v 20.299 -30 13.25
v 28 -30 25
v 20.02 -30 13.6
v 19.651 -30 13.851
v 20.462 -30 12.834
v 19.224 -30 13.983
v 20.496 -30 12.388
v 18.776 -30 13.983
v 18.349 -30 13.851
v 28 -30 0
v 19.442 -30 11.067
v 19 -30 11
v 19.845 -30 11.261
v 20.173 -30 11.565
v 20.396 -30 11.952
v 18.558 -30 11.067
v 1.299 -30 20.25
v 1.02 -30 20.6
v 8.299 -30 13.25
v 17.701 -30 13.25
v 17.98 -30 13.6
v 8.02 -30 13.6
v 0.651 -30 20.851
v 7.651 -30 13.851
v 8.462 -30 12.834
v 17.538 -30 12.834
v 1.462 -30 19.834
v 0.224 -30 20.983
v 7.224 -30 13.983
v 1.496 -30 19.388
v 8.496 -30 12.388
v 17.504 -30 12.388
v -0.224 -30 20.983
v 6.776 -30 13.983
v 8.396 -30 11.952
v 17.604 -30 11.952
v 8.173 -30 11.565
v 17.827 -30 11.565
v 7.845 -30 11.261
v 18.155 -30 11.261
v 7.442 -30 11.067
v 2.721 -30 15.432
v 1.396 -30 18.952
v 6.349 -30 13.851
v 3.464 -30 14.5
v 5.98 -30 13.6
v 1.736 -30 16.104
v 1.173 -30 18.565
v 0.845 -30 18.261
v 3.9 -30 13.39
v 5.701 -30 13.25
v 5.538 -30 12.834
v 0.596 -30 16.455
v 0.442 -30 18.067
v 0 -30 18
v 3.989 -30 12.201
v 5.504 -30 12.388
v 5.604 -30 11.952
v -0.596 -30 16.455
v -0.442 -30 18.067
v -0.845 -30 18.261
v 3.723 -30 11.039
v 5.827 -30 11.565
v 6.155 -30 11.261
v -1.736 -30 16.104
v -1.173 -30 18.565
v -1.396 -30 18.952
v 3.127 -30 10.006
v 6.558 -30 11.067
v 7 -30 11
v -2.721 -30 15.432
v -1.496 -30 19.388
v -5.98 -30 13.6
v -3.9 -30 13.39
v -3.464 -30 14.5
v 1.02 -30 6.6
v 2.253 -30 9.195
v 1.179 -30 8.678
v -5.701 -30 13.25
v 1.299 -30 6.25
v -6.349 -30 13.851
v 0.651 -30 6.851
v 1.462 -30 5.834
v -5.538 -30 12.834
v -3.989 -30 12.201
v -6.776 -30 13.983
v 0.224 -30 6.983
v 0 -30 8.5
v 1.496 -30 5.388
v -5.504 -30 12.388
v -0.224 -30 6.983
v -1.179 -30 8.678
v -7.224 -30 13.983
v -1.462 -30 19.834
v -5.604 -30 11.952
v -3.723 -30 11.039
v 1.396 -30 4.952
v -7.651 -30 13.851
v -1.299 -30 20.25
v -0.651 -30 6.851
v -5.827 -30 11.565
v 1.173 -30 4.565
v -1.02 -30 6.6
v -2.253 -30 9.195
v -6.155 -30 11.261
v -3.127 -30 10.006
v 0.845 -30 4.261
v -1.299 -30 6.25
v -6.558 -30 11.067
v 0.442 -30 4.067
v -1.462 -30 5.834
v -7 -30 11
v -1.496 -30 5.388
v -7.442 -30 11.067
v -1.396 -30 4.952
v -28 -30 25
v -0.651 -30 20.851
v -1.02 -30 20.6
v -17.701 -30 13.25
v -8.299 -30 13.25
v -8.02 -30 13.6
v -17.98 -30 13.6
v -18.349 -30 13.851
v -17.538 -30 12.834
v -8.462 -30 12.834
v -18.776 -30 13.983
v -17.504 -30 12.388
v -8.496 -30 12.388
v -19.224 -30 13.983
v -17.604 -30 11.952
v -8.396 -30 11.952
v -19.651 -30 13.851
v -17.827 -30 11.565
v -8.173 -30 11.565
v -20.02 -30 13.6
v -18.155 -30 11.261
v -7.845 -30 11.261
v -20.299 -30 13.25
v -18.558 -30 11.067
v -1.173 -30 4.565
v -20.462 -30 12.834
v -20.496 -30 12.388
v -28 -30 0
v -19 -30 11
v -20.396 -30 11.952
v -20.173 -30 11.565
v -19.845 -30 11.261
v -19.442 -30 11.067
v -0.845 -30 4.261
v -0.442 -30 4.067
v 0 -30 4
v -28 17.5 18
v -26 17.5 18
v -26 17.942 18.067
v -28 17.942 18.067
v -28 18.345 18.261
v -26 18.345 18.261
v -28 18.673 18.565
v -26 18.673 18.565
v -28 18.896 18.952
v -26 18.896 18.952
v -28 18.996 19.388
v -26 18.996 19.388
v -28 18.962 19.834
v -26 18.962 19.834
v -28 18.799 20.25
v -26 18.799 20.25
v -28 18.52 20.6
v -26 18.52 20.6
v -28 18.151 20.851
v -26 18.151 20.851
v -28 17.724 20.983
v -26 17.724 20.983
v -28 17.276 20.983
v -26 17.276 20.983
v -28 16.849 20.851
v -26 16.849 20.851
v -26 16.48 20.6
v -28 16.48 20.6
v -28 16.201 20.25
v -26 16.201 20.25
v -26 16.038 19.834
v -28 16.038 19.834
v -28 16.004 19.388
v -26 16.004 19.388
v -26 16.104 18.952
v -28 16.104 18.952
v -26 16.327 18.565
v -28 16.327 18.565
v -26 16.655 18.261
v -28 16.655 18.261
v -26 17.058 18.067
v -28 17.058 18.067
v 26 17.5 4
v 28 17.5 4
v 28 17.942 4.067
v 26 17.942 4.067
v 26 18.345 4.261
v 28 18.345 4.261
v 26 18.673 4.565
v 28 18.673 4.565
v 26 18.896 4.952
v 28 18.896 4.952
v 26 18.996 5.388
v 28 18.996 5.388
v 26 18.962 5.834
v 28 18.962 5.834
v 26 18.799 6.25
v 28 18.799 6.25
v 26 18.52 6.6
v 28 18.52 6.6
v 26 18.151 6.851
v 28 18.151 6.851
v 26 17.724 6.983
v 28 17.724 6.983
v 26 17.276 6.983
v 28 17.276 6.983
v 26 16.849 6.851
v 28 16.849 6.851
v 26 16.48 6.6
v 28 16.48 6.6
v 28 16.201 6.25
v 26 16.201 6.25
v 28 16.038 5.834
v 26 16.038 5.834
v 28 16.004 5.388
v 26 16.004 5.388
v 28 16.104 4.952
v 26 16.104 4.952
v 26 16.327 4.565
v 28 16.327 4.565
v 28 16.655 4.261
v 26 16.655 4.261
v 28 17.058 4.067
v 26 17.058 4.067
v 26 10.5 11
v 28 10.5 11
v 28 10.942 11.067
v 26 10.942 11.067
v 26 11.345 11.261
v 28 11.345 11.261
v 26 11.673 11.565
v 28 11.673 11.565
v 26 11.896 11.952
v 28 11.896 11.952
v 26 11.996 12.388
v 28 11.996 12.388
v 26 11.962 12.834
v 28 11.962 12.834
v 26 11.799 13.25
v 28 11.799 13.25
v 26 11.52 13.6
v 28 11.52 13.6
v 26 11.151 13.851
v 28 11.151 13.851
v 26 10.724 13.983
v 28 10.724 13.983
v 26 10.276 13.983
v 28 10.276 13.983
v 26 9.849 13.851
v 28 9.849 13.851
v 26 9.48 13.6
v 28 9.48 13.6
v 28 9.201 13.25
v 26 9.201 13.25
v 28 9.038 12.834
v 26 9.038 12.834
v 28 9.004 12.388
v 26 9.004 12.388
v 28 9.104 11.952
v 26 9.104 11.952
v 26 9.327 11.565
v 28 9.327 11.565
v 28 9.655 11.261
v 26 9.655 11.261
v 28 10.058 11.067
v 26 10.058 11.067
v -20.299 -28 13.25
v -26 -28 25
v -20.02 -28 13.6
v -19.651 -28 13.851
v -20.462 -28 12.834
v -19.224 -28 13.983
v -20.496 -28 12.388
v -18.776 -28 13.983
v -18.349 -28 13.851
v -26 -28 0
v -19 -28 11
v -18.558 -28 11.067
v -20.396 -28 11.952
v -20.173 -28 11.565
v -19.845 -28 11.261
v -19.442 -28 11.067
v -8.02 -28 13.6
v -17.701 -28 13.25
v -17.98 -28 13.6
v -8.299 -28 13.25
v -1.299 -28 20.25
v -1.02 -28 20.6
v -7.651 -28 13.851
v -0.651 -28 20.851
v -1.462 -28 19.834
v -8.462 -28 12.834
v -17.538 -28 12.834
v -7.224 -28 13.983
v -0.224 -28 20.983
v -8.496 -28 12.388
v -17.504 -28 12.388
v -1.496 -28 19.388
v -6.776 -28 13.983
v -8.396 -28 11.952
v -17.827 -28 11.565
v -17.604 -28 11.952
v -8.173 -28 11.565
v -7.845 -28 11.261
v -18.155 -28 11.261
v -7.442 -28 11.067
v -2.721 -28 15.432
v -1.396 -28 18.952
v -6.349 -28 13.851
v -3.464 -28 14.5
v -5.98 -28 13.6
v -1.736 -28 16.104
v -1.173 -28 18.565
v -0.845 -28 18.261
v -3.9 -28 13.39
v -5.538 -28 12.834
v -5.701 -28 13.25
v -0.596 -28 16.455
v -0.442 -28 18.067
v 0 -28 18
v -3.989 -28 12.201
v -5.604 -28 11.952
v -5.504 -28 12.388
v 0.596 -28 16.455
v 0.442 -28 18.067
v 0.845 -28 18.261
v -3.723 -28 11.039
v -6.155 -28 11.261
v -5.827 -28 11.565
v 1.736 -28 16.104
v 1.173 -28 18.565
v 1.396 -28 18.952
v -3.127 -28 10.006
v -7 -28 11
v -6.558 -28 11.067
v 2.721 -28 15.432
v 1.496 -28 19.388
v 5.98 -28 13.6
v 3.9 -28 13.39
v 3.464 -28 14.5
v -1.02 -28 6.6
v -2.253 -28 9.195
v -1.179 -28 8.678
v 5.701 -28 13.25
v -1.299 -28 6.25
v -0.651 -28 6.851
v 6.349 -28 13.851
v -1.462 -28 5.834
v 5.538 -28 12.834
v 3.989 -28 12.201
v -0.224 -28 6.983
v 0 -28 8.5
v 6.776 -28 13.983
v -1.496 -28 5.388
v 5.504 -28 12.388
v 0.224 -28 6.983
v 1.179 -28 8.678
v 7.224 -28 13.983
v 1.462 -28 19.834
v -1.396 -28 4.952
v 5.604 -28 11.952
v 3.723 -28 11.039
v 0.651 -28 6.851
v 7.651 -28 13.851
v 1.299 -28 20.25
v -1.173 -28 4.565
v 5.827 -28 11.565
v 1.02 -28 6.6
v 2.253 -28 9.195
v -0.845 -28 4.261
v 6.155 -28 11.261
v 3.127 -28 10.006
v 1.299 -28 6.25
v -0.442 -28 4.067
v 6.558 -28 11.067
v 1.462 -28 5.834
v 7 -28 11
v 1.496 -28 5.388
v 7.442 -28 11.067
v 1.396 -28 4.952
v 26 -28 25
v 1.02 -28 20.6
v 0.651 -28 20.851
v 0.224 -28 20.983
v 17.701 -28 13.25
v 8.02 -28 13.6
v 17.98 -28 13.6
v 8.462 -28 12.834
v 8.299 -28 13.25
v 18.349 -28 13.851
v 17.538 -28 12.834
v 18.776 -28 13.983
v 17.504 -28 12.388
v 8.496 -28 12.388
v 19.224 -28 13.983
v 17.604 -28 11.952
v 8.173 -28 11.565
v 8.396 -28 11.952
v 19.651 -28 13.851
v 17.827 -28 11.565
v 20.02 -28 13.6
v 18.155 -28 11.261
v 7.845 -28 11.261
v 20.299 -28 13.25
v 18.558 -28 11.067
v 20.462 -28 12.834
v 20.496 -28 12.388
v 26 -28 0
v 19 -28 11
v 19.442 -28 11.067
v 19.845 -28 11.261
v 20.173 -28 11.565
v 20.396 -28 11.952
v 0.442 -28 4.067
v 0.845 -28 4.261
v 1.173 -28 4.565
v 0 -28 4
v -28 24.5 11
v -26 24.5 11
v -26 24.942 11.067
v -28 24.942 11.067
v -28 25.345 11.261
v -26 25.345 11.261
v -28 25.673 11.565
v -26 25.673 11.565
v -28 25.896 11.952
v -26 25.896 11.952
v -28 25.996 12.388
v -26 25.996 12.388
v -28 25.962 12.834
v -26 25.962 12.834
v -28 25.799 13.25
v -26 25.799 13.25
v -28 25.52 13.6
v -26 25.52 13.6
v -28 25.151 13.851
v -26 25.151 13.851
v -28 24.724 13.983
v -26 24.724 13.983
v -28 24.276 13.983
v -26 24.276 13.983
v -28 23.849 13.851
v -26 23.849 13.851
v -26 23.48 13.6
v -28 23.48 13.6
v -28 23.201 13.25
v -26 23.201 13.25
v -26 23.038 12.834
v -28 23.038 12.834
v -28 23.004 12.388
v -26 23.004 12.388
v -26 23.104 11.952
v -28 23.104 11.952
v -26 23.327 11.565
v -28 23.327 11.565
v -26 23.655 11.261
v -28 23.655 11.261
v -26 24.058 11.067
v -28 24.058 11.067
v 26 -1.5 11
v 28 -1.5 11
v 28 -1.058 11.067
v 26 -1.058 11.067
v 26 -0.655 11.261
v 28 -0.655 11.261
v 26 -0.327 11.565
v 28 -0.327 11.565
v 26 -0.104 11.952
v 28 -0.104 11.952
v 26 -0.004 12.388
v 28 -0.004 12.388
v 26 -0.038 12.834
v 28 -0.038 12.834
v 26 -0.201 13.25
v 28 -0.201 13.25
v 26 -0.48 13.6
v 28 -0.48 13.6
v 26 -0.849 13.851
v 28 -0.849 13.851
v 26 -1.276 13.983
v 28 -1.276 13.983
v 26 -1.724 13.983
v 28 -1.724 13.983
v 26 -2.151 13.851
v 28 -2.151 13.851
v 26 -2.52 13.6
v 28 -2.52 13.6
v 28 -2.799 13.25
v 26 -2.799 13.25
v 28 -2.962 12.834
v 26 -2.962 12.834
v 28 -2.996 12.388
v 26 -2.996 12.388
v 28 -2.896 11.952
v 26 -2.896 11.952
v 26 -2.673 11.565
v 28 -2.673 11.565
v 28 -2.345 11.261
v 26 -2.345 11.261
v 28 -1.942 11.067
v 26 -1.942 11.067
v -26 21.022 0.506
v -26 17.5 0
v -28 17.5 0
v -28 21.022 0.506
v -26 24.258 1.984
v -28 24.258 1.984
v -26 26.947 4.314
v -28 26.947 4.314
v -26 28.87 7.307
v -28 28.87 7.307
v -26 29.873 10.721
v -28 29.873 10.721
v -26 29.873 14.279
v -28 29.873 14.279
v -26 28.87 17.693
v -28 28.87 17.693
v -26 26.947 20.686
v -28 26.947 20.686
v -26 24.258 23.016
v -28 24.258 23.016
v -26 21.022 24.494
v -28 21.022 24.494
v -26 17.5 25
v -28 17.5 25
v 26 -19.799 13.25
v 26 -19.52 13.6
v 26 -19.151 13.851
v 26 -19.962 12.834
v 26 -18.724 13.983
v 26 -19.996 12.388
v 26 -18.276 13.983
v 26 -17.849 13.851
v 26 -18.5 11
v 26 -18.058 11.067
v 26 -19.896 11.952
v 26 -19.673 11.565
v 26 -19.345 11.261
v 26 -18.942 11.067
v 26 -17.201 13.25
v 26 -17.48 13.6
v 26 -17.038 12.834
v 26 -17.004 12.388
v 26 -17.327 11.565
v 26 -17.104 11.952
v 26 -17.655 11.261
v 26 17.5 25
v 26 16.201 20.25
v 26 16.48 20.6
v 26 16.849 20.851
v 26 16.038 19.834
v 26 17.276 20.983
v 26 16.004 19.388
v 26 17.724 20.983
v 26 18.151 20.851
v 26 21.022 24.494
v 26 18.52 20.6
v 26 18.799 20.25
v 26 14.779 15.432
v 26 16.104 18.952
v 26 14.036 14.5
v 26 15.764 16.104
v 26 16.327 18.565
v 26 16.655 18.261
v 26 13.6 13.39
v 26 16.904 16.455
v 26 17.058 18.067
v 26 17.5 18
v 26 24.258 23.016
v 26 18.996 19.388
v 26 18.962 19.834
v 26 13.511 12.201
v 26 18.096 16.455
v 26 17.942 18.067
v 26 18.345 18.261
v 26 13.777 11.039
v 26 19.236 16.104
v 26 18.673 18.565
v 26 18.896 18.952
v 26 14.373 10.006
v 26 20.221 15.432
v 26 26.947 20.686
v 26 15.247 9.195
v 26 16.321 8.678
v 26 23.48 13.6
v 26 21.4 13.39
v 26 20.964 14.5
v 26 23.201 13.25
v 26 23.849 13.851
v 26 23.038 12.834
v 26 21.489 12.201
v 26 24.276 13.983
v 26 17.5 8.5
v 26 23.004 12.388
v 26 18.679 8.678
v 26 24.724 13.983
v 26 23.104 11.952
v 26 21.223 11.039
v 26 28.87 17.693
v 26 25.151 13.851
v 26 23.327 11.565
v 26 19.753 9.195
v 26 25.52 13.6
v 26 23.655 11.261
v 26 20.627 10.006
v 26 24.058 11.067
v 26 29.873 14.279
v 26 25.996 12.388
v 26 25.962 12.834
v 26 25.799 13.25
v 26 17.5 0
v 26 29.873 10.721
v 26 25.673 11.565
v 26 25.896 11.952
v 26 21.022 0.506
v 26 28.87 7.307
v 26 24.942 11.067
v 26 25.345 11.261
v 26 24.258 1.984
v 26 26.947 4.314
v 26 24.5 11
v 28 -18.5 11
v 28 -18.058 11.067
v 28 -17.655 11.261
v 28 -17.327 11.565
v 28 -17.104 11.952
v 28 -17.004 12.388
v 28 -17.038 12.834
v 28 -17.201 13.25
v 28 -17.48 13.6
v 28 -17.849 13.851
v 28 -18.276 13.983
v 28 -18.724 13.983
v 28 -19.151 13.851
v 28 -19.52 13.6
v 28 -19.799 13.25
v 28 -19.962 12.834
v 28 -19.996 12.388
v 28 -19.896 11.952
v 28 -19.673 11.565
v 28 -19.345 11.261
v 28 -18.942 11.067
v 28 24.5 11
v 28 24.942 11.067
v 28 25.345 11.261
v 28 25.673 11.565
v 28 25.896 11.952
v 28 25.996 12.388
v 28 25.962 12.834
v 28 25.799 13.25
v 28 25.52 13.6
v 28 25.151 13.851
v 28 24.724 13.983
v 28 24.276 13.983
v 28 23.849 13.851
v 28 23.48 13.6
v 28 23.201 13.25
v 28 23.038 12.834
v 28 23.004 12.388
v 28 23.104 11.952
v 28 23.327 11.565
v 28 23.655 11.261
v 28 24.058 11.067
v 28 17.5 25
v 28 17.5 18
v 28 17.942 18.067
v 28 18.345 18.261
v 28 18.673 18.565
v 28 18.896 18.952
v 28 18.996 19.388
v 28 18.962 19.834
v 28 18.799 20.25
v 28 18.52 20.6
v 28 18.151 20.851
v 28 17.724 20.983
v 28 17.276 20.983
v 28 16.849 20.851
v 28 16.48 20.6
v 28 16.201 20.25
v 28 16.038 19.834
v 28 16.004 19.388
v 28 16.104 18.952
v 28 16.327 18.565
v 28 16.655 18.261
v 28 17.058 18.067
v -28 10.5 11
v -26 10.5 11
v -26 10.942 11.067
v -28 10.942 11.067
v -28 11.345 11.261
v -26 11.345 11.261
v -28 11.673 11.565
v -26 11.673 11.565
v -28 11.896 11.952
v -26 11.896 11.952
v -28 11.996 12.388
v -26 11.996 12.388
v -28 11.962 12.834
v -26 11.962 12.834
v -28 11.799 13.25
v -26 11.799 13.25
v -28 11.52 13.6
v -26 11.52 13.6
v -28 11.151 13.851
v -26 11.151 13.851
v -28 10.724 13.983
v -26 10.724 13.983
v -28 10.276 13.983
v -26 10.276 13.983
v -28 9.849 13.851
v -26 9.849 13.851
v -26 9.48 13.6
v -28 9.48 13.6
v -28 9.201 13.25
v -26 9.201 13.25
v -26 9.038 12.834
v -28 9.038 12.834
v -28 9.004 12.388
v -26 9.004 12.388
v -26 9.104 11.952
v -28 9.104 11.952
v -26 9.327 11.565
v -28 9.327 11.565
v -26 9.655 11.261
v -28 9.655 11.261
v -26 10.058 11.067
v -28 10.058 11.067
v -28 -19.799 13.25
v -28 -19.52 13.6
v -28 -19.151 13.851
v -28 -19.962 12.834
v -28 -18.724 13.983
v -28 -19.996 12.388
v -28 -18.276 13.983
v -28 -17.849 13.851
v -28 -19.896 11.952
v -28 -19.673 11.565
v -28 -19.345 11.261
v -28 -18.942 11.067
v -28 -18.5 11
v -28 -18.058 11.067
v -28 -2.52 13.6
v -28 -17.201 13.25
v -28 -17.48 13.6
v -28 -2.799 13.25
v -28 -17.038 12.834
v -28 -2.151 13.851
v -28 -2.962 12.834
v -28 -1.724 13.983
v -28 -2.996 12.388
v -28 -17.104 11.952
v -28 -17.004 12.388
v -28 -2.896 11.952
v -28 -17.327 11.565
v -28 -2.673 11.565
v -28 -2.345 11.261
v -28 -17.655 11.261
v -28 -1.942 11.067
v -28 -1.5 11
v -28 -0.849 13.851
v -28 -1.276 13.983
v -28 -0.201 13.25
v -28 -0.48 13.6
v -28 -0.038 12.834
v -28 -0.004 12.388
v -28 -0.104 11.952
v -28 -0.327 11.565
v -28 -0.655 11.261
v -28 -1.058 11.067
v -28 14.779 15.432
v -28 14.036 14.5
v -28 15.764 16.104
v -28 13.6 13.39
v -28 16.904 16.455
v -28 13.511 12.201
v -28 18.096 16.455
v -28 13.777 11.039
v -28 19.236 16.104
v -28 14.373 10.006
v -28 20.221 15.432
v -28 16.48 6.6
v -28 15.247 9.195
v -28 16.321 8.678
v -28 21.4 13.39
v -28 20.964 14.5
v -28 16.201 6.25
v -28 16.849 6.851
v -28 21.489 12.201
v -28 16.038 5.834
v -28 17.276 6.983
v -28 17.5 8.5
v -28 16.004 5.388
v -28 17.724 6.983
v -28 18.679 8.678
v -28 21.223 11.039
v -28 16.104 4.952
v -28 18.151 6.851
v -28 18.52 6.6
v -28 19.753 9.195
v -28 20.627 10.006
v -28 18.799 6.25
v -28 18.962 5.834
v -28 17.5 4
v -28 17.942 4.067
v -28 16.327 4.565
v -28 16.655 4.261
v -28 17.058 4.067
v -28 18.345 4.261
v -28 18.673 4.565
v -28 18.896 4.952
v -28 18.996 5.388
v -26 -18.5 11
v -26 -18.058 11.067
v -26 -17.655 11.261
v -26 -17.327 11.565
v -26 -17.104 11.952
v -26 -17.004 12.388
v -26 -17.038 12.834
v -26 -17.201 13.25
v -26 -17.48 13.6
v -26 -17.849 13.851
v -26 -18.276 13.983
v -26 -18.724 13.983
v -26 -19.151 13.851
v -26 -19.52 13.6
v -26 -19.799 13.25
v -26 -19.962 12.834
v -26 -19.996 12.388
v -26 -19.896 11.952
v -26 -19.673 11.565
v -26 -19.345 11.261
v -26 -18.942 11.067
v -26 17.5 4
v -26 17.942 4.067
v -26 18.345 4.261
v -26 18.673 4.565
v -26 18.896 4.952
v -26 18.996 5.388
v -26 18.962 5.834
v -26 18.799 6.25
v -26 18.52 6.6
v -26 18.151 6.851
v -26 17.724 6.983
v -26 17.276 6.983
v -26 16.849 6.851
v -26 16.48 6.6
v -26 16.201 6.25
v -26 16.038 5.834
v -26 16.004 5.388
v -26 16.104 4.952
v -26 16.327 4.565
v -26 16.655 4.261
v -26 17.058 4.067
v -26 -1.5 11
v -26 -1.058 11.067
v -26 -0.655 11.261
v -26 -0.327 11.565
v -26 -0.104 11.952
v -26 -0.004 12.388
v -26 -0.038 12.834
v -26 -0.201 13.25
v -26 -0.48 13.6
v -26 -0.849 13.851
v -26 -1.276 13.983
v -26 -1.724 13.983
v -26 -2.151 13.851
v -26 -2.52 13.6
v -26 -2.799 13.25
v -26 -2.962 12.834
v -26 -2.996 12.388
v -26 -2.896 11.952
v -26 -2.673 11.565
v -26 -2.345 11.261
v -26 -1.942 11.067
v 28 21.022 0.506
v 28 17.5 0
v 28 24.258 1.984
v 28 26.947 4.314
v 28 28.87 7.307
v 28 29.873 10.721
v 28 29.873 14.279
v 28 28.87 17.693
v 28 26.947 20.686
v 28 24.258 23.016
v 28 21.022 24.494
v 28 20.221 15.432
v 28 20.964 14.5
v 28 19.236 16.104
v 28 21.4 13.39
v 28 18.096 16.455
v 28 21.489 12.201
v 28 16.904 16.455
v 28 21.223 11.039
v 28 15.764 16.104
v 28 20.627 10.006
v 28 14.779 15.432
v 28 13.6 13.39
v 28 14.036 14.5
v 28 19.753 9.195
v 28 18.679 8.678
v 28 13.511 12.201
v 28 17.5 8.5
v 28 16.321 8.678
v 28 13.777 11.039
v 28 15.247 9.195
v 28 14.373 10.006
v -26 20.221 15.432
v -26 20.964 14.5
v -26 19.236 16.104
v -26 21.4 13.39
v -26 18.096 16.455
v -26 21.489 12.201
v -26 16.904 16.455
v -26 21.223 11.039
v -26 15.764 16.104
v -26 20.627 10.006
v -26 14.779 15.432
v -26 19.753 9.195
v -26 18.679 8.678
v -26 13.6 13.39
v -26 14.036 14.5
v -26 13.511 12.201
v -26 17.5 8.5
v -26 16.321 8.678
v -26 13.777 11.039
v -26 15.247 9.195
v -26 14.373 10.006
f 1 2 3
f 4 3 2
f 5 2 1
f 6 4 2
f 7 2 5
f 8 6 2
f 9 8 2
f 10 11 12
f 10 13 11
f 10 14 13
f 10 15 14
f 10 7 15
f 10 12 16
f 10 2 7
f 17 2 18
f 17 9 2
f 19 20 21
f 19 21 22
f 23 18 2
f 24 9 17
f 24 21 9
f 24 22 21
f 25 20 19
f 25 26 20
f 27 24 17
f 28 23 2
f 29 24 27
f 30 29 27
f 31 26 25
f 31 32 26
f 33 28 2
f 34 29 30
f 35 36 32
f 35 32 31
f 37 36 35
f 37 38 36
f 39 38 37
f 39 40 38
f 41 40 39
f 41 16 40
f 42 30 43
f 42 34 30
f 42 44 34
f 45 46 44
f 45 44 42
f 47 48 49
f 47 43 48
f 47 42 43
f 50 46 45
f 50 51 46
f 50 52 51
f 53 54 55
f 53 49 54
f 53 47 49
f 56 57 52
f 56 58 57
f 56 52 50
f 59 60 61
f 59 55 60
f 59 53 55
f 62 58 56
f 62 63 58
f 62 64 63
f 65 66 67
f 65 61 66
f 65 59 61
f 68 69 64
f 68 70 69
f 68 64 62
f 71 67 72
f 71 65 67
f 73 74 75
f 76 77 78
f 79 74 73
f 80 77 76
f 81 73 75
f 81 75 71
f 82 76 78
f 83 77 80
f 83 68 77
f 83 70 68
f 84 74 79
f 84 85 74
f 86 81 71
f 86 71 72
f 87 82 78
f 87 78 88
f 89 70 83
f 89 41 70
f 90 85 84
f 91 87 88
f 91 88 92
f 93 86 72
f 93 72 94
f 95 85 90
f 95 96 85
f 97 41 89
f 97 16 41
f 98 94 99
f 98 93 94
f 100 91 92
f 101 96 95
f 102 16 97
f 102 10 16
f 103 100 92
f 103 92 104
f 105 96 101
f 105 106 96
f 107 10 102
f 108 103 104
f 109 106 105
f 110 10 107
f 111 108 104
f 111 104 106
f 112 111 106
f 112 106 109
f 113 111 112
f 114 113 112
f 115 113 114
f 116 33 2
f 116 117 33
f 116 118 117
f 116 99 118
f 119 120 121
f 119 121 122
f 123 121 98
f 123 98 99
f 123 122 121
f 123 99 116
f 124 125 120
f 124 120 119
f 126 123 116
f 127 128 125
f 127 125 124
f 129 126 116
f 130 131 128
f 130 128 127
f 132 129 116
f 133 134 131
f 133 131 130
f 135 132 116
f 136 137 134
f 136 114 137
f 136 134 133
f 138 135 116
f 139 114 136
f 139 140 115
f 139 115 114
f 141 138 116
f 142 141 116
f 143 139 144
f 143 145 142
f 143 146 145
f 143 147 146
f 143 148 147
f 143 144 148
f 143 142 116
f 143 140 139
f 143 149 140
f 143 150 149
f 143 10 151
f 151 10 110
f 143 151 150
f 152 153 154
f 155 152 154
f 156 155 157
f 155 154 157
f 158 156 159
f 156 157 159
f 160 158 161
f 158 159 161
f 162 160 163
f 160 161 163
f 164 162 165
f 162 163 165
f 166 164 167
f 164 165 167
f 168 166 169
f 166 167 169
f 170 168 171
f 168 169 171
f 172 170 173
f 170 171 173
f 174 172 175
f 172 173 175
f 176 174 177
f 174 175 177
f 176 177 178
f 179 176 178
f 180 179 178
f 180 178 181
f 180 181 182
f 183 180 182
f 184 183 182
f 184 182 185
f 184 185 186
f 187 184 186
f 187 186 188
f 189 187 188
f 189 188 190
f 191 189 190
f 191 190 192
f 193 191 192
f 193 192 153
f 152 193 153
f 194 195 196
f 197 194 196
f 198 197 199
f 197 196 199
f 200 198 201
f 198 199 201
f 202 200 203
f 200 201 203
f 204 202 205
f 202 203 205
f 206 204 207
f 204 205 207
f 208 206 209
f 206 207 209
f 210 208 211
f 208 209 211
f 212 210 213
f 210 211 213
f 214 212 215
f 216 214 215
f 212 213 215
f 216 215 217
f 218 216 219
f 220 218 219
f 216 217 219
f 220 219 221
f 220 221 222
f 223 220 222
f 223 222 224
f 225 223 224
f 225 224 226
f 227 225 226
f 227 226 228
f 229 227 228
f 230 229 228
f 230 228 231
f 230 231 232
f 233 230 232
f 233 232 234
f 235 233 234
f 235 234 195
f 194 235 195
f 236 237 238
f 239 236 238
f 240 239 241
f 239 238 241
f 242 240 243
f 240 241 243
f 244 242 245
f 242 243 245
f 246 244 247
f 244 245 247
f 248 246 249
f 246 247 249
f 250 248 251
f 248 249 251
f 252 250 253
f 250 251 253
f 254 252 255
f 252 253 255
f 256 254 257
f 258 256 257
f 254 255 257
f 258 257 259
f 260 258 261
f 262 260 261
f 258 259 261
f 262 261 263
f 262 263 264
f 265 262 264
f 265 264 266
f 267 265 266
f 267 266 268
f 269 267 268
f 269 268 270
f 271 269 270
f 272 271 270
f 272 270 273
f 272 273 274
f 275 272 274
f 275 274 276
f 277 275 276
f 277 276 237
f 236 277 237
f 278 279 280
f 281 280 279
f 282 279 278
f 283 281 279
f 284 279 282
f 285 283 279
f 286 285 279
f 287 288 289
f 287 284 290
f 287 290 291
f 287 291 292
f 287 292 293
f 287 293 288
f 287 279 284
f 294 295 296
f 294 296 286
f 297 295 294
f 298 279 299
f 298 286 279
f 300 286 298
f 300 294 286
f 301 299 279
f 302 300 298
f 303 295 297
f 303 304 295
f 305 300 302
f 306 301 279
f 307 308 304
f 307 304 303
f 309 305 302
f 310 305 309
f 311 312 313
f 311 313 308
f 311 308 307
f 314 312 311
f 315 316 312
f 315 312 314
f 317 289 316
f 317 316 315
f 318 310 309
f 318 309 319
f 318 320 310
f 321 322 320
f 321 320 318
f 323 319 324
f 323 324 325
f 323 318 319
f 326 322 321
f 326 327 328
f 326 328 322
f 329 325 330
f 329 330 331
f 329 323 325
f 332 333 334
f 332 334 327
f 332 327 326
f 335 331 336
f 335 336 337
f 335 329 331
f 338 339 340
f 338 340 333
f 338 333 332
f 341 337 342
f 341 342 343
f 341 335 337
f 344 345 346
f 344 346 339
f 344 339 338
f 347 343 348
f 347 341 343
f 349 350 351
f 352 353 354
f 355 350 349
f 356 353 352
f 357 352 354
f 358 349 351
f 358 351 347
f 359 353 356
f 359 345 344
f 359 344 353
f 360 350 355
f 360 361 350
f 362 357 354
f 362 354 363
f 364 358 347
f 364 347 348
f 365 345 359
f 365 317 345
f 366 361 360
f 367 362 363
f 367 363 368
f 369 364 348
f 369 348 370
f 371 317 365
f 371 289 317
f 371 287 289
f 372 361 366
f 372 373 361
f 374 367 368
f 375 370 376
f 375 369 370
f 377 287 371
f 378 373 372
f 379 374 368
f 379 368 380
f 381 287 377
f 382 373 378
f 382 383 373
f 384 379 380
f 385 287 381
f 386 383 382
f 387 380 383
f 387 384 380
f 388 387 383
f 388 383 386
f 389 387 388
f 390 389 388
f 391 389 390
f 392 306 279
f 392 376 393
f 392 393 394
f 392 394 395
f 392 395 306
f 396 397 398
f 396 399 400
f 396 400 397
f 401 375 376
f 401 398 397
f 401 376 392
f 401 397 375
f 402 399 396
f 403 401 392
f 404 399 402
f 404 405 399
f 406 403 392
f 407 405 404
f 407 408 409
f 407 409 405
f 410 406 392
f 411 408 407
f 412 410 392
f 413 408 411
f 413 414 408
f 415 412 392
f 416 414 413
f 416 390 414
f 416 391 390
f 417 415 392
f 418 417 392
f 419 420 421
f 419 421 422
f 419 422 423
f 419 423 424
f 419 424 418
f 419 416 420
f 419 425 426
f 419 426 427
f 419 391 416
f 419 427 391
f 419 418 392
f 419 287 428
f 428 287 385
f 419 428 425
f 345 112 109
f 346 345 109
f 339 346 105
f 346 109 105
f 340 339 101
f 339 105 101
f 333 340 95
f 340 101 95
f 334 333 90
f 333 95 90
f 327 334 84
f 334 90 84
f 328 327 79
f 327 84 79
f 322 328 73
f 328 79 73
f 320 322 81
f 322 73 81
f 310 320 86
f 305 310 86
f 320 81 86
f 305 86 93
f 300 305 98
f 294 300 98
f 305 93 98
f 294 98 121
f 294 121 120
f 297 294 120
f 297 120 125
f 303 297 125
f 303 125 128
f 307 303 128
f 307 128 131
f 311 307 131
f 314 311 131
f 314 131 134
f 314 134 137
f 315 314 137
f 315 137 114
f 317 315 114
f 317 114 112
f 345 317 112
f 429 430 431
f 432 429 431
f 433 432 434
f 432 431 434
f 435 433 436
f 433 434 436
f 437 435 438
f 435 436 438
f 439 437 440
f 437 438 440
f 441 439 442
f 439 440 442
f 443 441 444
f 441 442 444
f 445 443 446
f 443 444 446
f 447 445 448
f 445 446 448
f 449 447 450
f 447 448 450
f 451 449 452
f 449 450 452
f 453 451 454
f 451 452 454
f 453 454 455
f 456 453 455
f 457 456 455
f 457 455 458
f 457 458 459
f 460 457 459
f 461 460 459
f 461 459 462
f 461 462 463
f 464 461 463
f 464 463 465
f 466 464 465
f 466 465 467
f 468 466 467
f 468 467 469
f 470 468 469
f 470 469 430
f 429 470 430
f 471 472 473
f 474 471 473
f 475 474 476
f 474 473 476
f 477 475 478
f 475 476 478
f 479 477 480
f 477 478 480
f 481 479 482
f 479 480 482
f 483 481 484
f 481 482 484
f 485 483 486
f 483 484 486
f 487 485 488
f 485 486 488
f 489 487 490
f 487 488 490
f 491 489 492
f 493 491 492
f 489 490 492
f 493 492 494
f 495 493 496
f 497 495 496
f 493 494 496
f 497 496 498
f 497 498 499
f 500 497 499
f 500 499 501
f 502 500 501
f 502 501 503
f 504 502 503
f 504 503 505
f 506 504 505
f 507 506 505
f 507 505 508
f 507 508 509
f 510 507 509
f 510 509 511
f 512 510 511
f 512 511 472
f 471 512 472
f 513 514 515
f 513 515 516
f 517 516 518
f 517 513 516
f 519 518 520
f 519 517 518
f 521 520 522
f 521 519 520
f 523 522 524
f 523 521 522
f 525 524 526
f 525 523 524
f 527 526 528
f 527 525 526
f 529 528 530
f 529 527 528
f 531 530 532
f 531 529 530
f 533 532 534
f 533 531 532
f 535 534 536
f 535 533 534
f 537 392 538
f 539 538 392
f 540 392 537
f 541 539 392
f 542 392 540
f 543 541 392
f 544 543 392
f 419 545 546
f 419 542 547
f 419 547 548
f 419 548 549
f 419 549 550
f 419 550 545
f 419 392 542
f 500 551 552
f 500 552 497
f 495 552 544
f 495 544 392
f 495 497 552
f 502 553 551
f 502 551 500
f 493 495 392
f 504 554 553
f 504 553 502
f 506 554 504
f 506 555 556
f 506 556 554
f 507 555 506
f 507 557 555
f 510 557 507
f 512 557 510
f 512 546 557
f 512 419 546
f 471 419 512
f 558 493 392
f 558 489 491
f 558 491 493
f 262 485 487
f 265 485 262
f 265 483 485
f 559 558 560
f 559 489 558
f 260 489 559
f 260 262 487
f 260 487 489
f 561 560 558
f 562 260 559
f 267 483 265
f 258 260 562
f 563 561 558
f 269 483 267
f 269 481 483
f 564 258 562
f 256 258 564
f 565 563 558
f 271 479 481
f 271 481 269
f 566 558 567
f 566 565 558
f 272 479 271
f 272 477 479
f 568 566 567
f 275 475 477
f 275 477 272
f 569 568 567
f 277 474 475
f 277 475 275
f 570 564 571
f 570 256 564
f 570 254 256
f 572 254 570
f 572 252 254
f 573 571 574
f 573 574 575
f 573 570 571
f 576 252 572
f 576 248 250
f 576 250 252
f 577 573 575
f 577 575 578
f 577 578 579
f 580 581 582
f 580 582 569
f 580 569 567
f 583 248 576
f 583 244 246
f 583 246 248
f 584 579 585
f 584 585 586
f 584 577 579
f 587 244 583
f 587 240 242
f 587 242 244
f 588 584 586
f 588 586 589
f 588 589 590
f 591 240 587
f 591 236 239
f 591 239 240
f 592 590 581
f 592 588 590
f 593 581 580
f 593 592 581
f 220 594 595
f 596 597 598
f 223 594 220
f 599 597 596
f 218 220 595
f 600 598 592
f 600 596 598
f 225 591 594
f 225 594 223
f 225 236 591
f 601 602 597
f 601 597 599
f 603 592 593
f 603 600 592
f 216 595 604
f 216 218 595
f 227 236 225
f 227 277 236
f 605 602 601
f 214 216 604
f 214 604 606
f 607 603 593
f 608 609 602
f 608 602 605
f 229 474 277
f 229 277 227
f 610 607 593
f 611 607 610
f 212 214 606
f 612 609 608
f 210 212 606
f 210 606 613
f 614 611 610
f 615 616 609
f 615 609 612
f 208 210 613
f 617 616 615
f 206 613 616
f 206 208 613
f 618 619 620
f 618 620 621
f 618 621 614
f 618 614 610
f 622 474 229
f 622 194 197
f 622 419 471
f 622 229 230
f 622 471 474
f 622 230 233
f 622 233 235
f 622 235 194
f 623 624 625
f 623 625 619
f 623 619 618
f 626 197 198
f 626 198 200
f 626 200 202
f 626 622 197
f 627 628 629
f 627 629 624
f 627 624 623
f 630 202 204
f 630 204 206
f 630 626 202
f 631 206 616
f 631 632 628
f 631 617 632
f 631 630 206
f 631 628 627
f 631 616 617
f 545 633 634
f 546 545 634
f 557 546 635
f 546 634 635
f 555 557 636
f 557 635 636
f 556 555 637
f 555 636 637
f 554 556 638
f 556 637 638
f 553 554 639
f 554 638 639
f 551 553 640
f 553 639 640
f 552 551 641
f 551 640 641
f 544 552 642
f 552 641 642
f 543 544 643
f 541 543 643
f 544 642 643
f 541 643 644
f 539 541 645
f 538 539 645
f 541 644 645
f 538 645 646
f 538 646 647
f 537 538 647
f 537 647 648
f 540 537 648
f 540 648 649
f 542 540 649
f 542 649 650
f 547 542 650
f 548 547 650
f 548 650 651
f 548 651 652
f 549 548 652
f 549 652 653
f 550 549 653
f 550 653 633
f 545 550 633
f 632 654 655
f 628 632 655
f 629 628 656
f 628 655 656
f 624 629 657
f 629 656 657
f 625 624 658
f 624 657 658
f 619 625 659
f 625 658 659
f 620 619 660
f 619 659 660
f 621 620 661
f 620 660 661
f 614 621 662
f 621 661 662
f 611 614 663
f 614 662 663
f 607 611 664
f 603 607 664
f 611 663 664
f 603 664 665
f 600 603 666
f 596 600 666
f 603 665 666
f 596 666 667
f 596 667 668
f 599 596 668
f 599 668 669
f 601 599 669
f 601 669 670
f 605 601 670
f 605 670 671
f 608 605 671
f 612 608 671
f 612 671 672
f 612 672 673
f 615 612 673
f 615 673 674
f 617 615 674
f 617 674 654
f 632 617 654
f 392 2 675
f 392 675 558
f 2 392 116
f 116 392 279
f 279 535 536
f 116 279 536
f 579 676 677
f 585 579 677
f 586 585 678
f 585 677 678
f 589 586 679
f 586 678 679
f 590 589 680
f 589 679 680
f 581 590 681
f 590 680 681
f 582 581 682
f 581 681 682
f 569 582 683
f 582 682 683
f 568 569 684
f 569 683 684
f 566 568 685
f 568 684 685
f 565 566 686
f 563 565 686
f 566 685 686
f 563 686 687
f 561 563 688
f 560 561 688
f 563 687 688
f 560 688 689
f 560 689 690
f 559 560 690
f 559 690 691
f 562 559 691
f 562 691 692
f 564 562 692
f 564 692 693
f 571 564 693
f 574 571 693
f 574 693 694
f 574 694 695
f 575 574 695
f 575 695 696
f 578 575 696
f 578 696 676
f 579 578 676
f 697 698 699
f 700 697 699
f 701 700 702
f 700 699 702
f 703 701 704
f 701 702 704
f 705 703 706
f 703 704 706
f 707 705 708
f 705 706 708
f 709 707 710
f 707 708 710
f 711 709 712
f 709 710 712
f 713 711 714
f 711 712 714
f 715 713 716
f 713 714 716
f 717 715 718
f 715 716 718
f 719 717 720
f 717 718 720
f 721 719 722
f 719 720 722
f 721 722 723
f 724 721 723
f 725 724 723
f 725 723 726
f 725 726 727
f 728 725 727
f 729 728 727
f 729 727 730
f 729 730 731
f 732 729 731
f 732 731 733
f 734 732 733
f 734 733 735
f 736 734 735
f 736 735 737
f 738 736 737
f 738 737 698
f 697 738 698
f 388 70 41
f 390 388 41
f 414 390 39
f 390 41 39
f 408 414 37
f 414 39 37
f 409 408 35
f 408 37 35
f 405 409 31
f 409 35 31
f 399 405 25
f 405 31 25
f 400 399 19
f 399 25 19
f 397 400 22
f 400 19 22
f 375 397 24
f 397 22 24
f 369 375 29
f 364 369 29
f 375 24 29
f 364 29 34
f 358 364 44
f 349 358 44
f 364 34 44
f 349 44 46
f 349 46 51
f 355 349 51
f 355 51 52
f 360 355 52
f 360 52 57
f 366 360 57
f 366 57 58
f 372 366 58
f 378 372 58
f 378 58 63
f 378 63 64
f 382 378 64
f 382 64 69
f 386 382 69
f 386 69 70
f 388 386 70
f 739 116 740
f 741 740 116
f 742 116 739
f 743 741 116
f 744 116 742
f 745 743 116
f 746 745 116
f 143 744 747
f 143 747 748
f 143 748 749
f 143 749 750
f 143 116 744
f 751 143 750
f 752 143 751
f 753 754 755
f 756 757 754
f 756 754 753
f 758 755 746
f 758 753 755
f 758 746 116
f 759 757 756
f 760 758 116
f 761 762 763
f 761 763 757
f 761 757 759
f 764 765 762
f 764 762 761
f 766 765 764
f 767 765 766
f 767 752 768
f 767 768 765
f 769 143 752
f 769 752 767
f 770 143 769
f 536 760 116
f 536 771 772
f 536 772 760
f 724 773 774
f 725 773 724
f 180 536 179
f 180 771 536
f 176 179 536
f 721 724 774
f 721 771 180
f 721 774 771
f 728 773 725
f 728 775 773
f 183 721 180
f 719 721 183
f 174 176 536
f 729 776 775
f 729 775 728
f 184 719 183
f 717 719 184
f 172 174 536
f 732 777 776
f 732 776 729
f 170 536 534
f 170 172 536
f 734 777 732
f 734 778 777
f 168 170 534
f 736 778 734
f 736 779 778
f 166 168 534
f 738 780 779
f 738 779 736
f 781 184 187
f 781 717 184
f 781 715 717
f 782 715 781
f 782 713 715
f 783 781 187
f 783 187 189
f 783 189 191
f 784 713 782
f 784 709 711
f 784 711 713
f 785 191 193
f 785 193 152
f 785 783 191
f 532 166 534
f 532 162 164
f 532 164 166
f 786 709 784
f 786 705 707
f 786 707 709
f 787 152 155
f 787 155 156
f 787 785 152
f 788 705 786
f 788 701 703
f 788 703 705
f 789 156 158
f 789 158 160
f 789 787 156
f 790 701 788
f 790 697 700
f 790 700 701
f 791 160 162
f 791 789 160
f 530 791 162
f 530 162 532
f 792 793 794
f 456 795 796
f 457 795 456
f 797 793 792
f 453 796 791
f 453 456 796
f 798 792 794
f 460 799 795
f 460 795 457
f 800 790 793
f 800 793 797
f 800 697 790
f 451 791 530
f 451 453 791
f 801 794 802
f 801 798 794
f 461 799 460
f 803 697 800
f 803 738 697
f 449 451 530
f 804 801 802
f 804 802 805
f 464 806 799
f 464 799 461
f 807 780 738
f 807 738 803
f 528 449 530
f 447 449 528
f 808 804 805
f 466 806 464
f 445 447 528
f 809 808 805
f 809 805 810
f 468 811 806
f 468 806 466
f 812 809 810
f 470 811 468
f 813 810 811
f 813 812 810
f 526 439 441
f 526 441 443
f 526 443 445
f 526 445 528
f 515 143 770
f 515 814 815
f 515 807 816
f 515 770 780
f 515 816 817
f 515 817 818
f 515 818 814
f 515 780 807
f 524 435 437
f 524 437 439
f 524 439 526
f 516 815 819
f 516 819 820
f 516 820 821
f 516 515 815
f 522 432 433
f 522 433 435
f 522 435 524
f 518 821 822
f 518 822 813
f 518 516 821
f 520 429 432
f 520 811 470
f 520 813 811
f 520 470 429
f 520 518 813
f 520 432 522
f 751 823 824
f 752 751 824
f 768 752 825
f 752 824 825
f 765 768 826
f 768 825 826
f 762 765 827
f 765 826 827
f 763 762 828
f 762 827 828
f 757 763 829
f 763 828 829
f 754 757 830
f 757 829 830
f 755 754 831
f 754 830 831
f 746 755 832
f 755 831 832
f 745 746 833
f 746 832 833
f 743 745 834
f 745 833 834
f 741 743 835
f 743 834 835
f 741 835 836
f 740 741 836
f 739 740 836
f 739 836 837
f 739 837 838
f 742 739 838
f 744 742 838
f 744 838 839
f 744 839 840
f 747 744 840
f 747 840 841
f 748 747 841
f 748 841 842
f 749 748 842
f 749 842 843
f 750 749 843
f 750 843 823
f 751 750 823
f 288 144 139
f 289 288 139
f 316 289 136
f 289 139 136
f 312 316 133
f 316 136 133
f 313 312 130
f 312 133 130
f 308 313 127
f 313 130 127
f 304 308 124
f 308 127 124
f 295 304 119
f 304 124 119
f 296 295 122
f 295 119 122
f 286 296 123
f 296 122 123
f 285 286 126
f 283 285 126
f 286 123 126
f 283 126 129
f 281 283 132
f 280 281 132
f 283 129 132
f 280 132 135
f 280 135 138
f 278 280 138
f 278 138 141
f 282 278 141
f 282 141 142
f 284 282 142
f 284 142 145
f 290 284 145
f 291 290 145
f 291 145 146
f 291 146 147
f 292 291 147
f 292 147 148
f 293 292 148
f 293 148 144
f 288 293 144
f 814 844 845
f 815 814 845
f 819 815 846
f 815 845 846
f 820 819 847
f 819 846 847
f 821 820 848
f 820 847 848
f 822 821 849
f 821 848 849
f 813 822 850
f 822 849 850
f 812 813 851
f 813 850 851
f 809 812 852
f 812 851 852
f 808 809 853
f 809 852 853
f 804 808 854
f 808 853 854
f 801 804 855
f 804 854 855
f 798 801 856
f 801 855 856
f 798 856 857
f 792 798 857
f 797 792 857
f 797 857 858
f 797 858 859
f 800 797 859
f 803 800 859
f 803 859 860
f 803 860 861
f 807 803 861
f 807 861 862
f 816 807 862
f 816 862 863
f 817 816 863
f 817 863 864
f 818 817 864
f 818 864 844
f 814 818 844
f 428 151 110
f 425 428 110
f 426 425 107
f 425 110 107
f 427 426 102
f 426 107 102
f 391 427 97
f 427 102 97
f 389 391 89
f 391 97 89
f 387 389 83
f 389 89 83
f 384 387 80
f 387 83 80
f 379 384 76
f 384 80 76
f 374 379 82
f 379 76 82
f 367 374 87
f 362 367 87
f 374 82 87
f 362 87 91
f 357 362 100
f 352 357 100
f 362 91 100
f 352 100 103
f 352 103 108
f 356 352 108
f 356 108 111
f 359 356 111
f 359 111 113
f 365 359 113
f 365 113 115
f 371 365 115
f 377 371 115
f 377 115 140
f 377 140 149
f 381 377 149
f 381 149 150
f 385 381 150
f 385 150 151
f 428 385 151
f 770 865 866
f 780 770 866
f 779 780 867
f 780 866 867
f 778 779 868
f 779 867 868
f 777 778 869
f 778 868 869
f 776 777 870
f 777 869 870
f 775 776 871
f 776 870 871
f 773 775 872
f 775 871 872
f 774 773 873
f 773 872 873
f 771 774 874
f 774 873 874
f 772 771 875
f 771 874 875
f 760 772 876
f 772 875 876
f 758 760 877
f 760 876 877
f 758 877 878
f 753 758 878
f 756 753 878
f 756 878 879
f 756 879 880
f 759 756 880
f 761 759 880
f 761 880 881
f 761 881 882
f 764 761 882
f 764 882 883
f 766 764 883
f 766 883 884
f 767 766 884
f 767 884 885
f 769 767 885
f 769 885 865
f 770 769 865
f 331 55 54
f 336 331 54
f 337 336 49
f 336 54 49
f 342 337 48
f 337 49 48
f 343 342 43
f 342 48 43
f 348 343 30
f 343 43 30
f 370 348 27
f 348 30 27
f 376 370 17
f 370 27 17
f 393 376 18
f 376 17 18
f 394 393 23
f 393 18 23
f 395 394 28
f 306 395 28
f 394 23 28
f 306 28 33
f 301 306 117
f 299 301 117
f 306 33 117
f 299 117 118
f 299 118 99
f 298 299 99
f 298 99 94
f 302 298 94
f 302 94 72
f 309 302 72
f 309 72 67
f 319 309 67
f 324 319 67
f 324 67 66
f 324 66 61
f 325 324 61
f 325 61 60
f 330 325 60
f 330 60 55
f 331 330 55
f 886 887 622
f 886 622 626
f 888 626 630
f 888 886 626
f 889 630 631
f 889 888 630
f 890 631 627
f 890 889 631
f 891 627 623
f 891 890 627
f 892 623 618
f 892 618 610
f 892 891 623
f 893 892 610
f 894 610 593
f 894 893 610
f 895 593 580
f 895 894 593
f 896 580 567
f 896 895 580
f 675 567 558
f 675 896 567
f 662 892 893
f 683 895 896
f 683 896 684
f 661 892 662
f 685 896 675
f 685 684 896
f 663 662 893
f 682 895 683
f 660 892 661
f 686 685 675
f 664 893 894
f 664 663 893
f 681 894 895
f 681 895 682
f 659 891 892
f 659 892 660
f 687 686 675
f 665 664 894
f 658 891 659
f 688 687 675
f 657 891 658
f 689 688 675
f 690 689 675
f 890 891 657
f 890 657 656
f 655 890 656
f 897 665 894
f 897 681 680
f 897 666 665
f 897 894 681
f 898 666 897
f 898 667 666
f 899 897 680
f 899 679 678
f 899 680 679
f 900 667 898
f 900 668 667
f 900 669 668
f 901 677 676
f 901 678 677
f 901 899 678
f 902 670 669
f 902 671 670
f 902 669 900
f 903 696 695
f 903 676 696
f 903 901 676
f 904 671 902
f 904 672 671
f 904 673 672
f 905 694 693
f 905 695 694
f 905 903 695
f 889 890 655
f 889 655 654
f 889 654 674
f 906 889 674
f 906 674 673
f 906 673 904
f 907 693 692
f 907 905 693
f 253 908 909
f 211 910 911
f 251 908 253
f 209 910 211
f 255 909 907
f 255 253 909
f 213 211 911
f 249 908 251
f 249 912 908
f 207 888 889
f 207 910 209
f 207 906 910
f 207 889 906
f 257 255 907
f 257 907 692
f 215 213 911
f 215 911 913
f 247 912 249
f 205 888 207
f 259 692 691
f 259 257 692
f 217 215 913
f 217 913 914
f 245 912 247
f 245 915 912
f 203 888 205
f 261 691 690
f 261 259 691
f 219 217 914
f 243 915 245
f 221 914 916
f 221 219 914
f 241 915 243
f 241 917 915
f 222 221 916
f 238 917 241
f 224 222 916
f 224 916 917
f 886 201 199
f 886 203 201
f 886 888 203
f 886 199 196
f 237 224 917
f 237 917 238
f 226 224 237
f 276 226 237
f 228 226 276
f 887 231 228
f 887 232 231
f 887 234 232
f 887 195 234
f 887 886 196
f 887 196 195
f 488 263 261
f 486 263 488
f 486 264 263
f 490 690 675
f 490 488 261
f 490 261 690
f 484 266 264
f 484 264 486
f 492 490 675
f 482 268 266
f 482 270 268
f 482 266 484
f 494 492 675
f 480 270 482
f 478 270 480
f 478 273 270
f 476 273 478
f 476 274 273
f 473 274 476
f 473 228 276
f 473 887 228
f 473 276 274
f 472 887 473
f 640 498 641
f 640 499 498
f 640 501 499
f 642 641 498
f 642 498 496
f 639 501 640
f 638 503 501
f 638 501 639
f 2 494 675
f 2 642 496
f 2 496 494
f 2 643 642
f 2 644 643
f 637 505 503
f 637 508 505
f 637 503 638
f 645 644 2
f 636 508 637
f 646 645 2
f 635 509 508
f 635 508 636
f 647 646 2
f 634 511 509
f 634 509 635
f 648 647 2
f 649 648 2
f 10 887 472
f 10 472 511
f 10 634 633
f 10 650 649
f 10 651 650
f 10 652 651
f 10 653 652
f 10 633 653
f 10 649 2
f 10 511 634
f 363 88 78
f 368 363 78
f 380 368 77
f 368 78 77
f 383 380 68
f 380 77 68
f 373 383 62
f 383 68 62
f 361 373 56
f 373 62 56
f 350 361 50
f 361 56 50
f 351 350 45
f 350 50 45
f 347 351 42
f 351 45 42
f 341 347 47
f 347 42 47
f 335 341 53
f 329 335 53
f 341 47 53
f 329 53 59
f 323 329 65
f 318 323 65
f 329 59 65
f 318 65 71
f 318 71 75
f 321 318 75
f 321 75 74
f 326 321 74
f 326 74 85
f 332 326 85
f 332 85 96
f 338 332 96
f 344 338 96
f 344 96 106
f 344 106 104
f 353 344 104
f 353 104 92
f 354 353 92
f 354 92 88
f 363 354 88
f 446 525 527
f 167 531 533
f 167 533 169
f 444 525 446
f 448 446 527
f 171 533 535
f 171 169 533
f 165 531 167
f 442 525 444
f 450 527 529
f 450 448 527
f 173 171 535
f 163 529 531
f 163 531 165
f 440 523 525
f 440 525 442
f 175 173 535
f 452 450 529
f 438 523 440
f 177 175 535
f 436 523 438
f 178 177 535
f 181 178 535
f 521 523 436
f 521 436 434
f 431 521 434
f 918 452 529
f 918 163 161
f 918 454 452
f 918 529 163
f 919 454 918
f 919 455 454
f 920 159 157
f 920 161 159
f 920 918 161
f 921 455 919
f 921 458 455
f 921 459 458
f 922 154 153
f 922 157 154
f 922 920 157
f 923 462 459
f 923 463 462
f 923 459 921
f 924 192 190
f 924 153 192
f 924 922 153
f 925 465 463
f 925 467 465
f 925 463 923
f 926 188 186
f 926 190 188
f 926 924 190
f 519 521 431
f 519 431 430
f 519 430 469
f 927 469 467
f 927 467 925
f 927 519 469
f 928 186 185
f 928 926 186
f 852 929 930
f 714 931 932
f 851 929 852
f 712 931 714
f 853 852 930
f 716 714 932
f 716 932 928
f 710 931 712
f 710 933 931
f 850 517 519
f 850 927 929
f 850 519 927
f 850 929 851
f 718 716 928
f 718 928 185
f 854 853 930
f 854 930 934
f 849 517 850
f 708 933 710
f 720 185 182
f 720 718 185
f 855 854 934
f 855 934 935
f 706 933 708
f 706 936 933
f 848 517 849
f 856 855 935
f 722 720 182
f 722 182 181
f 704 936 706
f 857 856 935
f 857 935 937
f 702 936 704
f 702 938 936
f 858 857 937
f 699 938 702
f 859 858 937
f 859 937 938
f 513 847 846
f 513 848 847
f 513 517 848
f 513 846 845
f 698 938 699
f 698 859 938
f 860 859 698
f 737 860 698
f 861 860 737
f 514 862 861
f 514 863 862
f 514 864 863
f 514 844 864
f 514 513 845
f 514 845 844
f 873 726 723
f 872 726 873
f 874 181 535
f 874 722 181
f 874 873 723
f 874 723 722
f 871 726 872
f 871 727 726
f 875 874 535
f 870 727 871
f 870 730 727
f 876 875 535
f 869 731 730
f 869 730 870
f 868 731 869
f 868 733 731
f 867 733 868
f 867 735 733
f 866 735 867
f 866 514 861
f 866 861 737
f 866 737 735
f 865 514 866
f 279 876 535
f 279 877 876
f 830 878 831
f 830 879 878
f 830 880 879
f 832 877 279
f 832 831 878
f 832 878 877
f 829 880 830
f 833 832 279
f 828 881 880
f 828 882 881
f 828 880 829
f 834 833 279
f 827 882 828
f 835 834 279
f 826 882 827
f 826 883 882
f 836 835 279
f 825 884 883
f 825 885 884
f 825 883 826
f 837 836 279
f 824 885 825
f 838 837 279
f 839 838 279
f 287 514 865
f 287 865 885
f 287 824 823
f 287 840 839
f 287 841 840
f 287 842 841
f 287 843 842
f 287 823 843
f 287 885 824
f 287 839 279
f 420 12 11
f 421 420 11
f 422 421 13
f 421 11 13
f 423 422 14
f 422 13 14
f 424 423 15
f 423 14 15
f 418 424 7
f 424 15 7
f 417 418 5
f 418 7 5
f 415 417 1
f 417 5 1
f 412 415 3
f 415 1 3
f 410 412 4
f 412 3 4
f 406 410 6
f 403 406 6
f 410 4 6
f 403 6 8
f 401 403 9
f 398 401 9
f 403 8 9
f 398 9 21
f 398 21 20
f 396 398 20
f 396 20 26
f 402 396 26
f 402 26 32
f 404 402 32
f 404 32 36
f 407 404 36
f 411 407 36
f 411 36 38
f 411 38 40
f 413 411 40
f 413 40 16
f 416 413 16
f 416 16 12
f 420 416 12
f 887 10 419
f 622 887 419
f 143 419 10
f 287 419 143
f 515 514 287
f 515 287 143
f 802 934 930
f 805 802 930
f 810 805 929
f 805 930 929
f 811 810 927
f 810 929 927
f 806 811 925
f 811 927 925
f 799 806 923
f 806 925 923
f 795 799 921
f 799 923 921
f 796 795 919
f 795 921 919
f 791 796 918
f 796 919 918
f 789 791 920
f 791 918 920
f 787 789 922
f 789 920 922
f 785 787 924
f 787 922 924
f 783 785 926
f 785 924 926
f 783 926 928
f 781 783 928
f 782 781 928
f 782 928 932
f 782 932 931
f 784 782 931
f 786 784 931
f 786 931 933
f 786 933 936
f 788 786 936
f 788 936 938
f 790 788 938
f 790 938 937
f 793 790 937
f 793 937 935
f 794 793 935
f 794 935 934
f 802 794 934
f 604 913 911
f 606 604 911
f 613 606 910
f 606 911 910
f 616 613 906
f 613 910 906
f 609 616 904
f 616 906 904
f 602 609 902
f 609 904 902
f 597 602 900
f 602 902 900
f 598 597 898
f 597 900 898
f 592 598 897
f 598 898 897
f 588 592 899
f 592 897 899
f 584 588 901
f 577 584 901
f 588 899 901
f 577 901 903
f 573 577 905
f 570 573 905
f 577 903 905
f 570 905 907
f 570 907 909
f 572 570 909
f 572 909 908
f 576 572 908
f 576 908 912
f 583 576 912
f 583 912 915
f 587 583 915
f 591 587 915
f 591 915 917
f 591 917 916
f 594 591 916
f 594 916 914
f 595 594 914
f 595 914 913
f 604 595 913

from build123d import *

# Parameters (mm, degrees)
BOSS_EXTRUDE1_DEPTH = 25
SKETCH2_R           = 4
SKETCH2_R_2         = 1.5
CUT_EXTRUDE1_DEPTH  = 69.271516755
SKETCH3_R           = 4
SKETCH3_R_2         = 1.5
CUT_EXTRUDE2_DEPTH  = 71.774289117


with BuildPart() as part:
    # Sketch1 → Boss-Extrude1 (new body)
    with BuildSketch(Plane.XY):
        Polygon((-26, 30), (-26, -28), (26, -28), (26, 30), (28, 30), (28, -30), (-28, -30), (-28, 30), align=None)
    extrude(amount=BOSS_EXTRUDE1_DEPTH)

    # Sketch2 → Cut-Extrude1 (cut, through all)
    with BuildSketch(Plane(origin=(28, 0, 0), x_dir=(0, 0, -1), z_dir=(1, 0, 0))):
        with Locations((-12.5, 17.5)):
            Circle(SKETCH2_R)
        with Locations((-19.5, 17.5)):
            Circle(SKETCH2_R_2)
        with Locations((-12.5, -1.5)):
            Circle(SKETCH2_R_2)
        with Locations((-12.5, -18.5)):
            Circle(SKETCH2_R_2)
        with Locations((-12.5, 24.5)):
            Circle(SKETCH2_R_2)
        with Locations((-5.5, 17.5)):
            Circle(SKETCH2_R_2)
        with Locations((-12.5, 10.5)):
            Circle(SKETCH2_R_2)
        with BuildLine():
            Line((-25, 17.5), (-25, 33.655619926))
            Line((-25, 33.655619926), (0, 33.655619926))
            Line((0, 33.655619926), (0, 17.5))
            ThreePointArc((0, 17.5), (-12.5, 30), (-25, 17.5))
        make_face()
    extrude(amount=-CUT_EXTRUDE1_DEPTH, mode=Mode.SUBTRACT)

    # Sketch3 → Cut-Extrude2 (cut, through all)
    with BuildSketch(Plane.XZ.offset(30)):
        with Locations(Location((0, 12.5, 0), (0, 0, 270))):
            Circle(SKETCH3_R)
        with Locations(Location((-7, 12.5, 0), (0, 0, 270))):
            Circle(SKETCH3_R_2)
        with Locations(Location((0, 19.5, 0), (0, 0, 270))):
            Circle(SKETCH3_R_2)
        with Locations(Location((7, 12.5, 0), (0, 0, 270))):
            Circle(SKETCH3_R_2)
        with Locations(Location((0, 5.5, 0), (0, 0, 270))):
            Circle(SKETCH3_R_2)
        with Locations(Location((-19, 12.5, 0), (0, 0, 270))):
            Circle(SKETCH3_R_2)
        with Locations(Location((19, 12.5, 0), (0, 0, 270))):
            Circle(SKETCH3_R_2)
    extrude(amount=-CUT_EXTRUDE2_DEPTH, mode=Mode.SUBTRACT)


solid = part.part
